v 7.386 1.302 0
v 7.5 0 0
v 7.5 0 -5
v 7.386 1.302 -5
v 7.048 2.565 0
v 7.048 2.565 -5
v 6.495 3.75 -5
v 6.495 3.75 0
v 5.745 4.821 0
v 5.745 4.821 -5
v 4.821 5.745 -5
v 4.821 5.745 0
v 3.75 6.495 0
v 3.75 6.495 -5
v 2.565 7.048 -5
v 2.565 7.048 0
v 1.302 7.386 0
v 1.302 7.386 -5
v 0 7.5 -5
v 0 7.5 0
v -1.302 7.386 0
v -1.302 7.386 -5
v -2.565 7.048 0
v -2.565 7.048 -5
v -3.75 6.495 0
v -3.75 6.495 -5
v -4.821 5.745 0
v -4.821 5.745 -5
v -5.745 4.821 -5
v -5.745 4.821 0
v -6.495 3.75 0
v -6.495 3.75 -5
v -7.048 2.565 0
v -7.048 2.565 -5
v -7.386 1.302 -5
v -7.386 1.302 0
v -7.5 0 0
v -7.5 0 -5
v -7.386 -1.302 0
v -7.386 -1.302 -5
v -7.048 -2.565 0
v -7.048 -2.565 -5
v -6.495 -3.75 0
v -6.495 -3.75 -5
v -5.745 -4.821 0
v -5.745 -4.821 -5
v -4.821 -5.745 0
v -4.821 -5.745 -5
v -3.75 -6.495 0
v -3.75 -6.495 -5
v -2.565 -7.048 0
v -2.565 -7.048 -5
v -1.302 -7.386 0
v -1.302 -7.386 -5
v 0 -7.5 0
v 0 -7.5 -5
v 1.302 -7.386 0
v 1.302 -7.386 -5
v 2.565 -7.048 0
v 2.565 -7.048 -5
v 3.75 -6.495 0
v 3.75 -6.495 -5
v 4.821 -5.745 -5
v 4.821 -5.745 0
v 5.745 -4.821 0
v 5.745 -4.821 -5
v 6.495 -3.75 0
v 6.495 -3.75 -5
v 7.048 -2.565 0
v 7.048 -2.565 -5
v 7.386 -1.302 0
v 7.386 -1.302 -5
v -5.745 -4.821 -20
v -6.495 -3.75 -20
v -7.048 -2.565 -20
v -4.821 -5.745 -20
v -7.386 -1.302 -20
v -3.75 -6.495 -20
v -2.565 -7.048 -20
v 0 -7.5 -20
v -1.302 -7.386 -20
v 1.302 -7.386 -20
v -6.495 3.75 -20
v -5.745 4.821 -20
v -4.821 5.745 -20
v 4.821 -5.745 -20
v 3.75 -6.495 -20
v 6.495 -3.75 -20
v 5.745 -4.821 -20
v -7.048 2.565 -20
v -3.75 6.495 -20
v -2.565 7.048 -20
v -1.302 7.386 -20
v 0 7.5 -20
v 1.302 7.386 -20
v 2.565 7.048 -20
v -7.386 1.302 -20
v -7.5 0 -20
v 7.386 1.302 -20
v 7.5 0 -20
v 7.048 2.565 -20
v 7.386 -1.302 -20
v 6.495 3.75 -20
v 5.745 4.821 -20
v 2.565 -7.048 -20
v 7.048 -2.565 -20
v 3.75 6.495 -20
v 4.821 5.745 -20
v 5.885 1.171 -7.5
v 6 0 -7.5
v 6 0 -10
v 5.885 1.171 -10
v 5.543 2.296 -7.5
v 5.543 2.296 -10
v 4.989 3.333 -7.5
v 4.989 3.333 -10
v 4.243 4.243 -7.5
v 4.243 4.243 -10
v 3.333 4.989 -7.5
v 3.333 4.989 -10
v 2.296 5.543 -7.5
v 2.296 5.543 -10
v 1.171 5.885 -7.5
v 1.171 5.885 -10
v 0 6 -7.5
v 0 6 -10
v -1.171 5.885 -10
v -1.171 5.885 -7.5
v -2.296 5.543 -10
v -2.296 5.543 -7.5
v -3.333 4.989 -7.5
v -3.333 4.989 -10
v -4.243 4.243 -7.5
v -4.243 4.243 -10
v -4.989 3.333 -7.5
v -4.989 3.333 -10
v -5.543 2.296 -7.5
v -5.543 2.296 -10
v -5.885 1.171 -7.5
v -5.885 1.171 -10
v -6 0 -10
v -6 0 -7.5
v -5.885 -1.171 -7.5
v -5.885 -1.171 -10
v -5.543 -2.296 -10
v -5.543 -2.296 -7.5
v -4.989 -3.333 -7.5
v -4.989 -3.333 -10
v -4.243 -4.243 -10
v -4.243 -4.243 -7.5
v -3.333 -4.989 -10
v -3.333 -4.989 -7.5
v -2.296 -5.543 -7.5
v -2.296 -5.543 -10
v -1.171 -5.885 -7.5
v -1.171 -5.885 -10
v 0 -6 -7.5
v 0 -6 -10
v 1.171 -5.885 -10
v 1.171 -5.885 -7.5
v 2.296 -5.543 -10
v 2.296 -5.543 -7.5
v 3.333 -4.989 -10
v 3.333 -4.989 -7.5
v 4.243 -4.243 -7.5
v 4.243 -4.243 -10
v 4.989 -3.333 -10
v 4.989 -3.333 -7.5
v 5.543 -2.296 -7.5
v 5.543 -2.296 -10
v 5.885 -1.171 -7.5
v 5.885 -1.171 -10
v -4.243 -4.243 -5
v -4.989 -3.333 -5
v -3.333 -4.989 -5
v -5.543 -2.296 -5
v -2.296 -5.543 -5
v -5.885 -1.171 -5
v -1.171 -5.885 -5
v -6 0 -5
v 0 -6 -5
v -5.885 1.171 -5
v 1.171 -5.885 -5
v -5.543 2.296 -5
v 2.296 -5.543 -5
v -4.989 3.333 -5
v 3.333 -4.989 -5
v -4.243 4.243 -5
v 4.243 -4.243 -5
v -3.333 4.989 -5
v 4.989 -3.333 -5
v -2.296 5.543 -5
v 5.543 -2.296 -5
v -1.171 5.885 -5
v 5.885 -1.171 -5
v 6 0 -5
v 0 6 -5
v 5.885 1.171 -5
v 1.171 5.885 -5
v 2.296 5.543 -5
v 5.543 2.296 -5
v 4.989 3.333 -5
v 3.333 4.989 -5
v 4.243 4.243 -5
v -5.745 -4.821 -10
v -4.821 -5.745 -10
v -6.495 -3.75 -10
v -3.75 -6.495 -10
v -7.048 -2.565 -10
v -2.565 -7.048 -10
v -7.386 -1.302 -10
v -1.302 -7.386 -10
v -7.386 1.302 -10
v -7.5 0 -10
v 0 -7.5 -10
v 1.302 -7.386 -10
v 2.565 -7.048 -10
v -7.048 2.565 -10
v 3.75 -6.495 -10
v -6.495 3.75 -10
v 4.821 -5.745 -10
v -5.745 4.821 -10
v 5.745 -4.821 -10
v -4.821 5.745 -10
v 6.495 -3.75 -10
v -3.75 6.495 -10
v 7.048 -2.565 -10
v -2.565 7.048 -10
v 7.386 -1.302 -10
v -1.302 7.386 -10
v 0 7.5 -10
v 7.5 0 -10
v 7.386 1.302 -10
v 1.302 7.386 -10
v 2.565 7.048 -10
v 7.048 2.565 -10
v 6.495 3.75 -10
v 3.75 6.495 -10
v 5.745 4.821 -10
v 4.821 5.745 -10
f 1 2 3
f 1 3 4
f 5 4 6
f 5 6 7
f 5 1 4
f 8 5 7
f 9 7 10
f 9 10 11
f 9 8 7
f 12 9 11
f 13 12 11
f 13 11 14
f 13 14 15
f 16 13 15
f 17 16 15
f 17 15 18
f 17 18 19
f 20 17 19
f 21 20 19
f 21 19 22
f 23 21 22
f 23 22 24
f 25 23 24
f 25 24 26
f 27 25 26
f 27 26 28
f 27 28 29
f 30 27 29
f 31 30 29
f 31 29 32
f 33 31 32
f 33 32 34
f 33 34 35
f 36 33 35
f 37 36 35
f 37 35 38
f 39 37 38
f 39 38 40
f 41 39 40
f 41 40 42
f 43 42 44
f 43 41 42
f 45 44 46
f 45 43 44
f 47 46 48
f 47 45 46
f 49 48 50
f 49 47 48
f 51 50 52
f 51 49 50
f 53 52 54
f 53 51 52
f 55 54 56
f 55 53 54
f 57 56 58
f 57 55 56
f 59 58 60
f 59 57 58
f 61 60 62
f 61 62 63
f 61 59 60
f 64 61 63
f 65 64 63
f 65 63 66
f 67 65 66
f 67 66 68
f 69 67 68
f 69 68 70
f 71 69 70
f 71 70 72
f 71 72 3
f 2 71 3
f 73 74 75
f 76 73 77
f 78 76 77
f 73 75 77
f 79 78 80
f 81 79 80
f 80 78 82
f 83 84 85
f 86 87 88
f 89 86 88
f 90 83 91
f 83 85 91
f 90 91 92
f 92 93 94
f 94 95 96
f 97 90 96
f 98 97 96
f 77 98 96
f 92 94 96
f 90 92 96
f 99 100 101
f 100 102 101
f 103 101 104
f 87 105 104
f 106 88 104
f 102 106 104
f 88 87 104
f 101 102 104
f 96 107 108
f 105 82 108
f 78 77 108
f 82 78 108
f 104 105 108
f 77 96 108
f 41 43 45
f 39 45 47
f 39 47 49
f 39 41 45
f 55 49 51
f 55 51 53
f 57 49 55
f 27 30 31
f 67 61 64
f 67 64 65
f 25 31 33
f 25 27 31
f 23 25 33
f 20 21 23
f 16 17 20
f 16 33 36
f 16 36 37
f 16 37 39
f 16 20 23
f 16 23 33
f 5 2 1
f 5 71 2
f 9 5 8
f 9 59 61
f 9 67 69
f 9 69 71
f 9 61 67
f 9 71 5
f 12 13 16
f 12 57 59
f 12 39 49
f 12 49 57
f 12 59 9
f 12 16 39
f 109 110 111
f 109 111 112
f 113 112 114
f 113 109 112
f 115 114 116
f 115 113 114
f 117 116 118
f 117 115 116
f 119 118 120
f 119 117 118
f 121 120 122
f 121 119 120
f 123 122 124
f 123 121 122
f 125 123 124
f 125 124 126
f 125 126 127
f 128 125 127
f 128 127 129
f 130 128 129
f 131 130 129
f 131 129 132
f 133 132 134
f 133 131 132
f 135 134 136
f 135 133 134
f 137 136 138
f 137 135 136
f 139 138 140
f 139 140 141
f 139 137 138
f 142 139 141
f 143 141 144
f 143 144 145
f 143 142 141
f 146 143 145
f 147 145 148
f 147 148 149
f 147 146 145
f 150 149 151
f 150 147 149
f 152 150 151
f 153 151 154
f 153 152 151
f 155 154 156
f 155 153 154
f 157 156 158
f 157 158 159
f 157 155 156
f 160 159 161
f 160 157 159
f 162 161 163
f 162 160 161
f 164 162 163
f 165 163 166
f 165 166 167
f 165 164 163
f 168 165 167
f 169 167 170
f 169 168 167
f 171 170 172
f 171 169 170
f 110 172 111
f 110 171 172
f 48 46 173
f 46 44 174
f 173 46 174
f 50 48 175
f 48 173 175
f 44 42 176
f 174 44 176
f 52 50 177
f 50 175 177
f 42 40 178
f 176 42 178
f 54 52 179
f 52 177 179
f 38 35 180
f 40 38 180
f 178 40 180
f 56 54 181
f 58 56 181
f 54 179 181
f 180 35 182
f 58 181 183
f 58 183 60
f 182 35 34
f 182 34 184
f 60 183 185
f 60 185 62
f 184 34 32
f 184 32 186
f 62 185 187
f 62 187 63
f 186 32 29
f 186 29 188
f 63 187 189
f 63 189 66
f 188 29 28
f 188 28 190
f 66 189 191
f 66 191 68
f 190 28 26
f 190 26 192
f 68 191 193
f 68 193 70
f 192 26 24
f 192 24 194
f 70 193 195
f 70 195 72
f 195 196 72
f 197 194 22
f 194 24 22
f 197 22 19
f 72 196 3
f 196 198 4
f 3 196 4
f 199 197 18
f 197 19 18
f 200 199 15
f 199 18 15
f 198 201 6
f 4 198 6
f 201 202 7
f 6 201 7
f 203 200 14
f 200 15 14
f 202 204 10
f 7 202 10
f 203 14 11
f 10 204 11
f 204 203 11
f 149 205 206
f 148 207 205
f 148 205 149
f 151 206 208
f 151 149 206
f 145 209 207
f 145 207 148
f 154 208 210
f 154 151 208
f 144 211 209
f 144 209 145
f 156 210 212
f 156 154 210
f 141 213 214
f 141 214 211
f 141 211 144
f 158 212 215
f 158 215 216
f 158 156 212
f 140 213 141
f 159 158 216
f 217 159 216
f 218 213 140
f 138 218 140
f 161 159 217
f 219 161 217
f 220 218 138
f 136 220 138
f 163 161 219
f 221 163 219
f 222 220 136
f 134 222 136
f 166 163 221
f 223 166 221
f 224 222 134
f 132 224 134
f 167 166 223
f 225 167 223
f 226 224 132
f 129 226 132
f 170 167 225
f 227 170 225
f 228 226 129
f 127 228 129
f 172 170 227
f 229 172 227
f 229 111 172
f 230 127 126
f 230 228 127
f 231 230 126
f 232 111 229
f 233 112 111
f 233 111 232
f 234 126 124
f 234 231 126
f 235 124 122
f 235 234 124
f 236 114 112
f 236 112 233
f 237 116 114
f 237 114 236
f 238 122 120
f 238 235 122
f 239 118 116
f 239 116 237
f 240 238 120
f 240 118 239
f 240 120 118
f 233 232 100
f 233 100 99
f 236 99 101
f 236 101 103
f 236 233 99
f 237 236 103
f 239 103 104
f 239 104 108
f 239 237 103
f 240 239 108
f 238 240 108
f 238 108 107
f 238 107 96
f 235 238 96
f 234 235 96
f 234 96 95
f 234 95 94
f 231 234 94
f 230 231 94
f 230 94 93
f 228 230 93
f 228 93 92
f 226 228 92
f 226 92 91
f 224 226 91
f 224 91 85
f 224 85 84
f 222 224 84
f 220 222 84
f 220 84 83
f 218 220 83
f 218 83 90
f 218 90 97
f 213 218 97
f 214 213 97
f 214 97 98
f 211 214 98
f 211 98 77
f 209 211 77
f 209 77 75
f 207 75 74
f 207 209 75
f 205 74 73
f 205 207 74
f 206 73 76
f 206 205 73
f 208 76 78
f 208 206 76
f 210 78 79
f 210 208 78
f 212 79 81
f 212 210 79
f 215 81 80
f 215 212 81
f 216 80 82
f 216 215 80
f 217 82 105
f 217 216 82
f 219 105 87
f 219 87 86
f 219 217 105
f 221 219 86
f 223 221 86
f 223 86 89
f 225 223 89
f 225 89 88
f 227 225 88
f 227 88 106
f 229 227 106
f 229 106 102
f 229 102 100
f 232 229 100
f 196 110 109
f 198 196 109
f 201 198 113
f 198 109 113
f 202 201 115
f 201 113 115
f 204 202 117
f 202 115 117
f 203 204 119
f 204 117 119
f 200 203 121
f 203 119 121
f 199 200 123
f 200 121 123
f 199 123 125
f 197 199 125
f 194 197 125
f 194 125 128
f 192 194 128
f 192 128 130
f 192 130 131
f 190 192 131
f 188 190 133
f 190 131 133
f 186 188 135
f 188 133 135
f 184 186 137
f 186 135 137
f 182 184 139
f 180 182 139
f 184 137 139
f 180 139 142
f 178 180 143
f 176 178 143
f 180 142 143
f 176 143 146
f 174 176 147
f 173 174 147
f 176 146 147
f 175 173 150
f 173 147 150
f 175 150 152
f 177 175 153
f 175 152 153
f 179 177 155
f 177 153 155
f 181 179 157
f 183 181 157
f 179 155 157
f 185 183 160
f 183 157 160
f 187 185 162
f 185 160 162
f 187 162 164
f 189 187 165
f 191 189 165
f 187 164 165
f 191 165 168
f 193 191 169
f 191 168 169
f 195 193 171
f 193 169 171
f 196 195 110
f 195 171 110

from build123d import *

# Parameters (mm, degrees)
SKETCH1_R               = 7.5
BOSS_EXTRUDE1_DEPTH     = 20
SKETCH4_R               = 7.5
SKETCH4_R_2             = 6
CUT_EXTRUDE2_DEPTH      = 2.5
CUT_EXTRUDE2_DEPTH_BACK = 2.5


with BuildPart() as part:
    # Sketch1 → Boss-Extrude1 (new body)
    with BuildSketch(Plane.XY):
        Circle(SKETCH1_R)
    extrude(amount=-BOSS_EXTRUDE1_DEPTH)

    # Sketch4 → Cut-Extrude2 (cut, two sides)
    with BuildSketch(Plane.XY.offset(-7.5)) as cut_extrude2_sk:
        Circle(SKETCH4_R)
        Circle(SKETCH4_R_2, mode=Mode.SUBTRACT)
    extrude(amount=CUT_EXTRUDE2_DEPTH, mode=Mode.SUBTRACT)
    extrude(cut_extrude2_sk.sketch, amount=-CUT_EXTRUDE2_DEPTH_BACK, mode=Mode.SUBTRACT)


solid = part.part
